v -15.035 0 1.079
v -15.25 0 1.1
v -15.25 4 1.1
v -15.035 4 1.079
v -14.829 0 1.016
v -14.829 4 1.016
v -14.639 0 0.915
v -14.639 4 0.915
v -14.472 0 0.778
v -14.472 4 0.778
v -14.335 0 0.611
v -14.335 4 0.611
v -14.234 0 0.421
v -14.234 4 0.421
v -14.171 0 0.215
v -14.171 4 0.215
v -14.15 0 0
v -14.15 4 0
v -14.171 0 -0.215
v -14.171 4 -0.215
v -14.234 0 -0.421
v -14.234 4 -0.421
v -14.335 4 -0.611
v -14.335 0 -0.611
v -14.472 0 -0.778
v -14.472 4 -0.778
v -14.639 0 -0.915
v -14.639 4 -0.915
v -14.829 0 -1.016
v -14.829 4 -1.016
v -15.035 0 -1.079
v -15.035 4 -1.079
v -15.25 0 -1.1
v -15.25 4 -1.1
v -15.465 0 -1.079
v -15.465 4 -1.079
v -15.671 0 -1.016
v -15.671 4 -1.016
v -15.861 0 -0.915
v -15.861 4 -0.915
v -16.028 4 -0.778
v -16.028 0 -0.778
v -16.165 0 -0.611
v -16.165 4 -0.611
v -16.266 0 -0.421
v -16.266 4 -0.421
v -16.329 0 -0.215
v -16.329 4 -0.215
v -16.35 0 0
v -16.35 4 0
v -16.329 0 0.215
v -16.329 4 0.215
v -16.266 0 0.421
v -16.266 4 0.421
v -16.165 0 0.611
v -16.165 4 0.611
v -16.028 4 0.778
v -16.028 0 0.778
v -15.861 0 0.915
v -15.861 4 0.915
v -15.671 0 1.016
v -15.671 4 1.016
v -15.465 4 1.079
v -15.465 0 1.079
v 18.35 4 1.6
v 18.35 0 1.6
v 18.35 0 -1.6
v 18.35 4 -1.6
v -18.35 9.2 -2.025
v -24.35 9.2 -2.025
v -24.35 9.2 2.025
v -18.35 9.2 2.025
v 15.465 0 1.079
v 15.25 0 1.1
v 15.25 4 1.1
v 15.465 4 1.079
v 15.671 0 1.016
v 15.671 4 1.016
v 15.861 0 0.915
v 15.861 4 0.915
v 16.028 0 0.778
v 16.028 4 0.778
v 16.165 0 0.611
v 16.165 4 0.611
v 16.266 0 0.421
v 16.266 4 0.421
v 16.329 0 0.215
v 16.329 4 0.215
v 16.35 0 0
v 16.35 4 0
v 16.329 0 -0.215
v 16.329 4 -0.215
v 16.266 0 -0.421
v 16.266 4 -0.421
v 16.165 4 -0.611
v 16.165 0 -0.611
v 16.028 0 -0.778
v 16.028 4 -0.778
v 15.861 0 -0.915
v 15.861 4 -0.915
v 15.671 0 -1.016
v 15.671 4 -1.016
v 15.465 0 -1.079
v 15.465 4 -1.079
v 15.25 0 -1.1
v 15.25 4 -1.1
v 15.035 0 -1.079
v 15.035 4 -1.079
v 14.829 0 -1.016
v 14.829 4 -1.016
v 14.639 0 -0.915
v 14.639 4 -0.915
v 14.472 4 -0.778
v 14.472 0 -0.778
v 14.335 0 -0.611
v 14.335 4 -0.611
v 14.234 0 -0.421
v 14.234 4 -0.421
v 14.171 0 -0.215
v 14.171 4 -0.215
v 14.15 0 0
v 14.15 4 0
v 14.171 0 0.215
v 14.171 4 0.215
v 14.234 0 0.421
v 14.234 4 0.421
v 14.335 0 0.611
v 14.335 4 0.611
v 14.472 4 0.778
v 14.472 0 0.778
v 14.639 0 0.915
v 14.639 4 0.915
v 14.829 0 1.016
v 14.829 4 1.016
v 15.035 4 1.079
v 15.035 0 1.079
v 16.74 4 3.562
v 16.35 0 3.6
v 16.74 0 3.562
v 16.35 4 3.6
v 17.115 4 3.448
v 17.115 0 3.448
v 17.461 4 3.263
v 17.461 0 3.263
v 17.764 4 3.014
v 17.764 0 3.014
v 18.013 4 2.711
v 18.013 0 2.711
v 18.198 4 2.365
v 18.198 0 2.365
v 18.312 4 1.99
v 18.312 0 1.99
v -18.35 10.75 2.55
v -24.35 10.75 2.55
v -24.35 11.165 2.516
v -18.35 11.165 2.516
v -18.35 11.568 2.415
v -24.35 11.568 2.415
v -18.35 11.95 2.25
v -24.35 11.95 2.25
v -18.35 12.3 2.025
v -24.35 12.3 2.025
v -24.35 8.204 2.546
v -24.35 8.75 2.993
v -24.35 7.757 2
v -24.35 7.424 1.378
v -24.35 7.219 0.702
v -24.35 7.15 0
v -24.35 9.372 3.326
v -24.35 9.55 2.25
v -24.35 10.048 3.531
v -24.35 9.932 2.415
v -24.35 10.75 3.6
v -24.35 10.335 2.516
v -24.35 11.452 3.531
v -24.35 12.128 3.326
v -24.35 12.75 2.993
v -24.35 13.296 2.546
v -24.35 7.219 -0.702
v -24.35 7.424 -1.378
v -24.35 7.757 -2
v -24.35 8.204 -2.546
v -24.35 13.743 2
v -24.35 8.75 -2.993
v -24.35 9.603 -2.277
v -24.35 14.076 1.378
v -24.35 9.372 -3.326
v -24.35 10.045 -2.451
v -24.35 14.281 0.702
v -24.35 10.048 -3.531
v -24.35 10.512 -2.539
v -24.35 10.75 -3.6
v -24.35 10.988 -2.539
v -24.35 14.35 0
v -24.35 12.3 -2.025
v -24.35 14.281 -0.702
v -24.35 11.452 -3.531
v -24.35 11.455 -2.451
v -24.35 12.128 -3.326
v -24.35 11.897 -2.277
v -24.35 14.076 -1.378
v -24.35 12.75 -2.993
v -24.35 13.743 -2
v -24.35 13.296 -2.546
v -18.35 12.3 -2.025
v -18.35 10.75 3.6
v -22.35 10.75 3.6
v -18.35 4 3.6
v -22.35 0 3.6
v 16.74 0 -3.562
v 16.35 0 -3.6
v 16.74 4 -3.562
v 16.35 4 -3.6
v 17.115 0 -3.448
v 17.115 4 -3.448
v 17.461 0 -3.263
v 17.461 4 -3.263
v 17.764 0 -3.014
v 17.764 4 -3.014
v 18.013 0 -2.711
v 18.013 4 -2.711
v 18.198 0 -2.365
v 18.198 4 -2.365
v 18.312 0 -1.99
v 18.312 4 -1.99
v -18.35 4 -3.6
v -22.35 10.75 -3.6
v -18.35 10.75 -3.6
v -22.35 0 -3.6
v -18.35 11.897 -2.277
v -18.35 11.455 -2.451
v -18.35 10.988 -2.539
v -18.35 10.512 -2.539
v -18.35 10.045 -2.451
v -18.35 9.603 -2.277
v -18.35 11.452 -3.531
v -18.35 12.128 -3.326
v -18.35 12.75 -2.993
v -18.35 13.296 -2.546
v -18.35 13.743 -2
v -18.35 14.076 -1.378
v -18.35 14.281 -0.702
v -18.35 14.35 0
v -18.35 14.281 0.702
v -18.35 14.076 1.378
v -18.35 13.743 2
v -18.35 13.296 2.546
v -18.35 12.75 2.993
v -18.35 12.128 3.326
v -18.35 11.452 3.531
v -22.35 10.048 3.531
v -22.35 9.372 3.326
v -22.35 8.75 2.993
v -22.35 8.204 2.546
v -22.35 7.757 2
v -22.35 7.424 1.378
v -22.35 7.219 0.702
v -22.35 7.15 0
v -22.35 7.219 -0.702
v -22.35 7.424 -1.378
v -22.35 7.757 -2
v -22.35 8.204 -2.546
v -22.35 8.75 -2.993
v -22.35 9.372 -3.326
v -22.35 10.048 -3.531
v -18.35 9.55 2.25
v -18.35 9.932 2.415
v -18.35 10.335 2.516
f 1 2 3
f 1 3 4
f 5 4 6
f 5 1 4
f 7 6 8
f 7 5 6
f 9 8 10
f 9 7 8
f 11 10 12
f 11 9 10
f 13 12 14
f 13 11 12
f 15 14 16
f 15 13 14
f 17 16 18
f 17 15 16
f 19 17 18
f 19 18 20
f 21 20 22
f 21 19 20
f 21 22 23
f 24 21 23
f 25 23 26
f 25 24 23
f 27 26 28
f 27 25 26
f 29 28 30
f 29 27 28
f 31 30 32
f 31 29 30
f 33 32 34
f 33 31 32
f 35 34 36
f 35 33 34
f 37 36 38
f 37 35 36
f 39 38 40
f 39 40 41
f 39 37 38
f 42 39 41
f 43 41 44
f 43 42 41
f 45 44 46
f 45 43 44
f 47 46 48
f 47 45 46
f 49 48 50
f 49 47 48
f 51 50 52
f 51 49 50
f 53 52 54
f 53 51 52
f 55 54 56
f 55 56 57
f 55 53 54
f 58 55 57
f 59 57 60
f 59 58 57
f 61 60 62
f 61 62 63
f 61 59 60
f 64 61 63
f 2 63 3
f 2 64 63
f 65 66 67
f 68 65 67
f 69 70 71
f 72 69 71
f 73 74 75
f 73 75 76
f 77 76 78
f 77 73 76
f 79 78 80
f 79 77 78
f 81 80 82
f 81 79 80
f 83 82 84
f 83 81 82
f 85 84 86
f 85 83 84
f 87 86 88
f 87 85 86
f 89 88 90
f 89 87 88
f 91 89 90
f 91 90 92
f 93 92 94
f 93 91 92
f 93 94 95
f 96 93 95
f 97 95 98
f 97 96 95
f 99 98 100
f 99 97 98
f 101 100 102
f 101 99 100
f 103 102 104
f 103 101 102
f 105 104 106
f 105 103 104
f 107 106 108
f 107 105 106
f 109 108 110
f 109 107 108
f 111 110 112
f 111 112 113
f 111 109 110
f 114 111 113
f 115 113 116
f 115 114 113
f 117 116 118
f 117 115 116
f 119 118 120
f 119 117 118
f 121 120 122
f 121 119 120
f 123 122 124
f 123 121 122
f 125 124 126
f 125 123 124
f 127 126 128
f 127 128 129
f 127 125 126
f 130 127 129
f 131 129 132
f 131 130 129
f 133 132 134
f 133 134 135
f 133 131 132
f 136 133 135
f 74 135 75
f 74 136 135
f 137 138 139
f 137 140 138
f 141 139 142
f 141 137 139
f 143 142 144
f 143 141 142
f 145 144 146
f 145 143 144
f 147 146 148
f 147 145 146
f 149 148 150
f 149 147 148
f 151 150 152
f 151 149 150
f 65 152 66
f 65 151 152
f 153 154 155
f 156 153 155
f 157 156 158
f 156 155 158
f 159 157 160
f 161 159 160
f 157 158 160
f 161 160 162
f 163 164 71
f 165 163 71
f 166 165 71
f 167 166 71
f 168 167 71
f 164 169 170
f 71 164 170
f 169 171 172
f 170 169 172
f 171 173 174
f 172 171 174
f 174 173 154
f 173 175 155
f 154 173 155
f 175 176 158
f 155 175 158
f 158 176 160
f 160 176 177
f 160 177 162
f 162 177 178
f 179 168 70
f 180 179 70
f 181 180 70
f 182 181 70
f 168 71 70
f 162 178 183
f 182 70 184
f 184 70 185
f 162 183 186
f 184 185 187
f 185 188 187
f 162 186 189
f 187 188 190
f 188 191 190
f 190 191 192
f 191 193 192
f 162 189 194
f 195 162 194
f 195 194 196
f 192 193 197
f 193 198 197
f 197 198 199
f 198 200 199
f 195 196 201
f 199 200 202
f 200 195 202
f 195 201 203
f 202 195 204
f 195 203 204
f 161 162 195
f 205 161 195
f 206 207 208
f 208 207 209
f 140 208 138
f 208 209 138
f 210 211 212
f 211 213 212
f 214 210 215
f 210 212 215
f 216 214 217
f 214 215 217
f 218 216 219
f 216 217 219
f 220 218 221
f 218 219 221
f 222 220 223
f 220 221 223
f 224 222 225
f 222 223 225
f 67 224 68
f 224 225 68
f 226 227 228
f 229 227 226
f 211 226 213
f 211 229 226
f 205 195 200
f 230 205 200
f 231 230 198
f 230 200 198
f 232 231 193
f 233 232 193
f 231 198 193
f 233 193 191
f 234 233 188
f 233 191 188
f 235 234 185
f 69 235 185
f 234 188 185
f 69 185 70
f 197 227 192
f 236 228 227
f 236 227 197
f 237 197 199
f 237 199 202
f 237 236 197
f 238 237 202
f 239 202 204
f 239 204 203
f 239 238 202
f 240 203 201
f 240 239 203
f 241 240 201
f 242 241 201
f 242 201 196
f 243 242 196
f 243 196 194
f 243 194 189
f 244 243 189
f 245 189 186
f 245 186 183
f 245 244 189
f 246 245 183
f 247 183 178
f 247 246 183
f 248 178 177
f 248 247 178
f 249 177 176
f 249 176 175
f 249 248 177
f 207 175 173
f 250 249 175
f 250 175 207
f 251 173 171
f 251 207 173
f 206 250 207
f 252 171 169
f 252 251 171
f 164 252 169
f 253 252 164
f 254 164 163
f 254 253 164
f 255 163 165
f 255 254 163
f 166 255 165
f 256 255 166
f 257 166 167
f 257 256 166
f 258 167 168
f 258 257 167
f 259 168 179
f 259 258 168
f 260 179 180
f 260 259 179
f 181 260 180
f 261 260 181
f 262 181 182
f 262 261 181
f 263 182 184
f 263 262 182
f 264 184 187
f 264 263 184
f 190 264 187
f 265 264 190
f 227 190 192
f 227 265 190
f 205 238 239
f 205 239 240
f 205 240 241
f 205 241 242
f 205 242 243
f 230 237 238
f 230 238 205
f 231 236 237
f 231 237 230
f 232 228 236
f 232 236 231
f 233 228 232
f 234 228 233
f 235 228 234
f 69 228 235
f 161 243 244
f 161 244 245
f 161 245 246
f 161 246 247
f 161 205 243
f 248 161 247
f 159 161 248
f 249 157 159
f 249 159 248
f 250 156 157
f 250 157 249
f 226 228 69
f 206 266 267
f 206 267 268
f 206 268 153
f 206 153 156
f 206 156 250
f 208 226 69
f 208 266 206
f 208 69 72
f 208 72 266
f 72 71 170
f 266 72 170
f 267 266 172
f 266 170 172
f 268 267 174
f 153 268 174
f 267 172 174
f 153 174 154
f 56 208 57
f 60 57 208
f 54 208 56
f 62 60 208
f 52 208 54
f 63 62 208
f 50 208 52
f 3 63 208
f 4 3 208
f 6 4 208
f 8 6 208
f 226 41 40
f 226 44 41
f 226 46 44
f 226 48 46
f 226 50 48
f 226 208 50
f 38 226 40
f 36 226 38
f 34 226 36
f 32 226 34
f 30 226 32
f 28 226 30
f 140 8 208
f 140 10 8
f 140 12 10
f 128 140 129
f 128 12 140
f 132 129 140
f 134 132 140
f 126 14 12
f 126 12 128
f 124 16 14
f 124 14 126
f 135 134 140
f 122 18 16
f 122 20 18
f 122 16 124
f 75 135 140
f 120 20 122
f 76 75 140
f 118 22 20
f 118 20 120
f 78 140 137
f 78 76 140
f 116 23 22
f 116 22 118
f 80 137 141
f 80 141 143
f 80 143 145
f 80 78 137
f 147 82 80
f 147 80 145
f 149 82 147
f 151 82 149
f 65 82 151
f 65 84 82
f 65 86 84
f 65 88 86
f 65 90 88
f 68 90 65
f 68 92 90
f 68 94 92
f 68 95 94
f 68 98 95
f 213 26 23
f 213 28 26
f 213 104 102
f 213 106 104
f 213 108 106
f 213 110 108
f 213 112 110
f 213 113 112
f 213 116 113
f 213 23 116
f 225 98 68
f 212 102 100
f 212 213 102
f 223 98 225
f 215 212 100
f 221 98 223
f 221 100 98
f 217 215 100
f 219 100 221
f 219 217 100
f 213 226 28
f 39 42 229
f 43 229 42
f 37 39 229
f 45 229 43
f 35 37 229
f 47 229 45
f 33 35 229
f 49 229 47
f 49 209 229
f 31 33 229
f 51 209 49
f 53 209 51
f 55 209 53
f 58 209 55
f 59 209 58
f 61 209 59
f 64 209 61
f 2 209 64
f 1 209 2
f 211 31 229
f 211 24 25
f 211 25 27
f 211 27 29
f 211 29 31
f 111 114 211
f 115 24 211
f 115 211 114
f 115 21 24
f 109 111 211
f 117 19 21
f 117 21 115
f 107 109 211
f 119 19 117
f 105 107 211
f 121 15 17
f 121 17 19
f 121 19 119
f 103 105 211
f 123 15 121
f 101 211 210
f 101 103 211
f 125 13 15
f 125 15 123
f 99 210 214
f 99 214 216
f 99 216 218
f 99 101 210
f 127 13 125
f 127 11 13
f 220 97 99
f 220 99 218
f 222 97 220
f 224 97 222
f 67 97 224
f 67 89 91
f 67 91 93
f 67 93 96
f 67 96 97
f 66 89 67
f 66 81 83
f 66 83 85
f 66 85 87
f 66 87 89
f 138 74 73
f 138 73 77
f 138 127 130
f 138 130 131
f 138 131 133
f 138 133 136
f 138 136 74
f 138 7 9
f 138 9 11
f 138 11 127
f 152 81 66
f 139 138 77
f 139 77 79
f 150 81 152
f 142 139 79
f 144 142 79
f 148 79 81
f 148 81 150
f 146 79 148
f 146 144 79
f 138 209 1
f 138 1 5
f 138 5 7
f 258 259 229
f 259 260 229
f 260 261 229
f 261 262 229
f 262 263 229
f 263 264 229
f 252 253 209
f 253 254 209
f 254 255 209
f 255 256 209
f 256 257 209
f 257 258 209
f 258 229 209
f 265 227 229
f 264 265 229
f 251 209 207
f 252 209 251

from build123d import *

# Parameters (mm, degrees)
SKETCH1_W           = 36.7
SKETCH1_H           = 7.2
SKETCH1_R           = 1.1
BOSS_EXTRUDE1_DEPTH = 4
SKETCH2_W           = 4
SKETCH2_H           = 7.2
BOSS_EXTRUDE2_DEPTH = 10.75
SKETCH3_R           = 3.6
BOSS_EXTRUDE3_DEPTH = 6
FILLET1_R           = 2
CUT_EXTRUDE1_DEPTH  = 6


with BuildPart() as part:
    # Sketch1 → Boss-Extrude1 (new body)
    with BuildSketch(Plane(origin=(0, 0, 0), x_dir=(1, 0, 0), z_dir=(0, 1, 0))):
        Rectangle(SKETCH1_W, SKETCH1_H)
        with Locations(Location((15.25, 0, 0), (0, 0, 270))):
            Circle(SKETCH1_R, mode=Mode.SUBTRACT)
        with Locations(Location((-15.25, 0, 0), (0, 0, 270))):
            Circle(SKETCH1_R, mode=Mode.SUBTRACT)
    extrude(amount=BOSS_EXTRUDE1_DEPTH)

    # Sketch2 → Boss-Extrude2 (add)
    with BuildSketch(Plane.XZ):
        with Locations((-20.35, 0)):
            Rectangle(SKETCH2_W, SKETCH2_H)
    extrude(amount=-BOSS_EXTRUDE2_DEPTH)

    # Sketch3 → Boss-Extrude3 (add)
    with BuildSketch(Plane(origin=(-18.35, 0, 0), x_dir=(0, 0, -1), z_dir=(1, 0, 0))):
        with Locations((0, 10.75)):
            Circle(SKETCH3_R)
    extrude(amount=-BOSS_EXTRUDE3_DEPTH)

    # Fillet1
    fillet1_edges = [part.edges().sort_by_distance(p)[0] for p in [
        (18.35, 2, -3.6),
        (18.35, 2, 3.6),
    ]]
    fillet(fillet1_edges, radius=FILLET1_R)

    # Sketch4 → Cut-Extrude1 (cut)
    with BuildSketch(Plane.ZY.offset(24.35)):
        with BuildLine():
            Line((-2.024845673, 9.2), (0, 9.2))
            Line((0, 9.2), (0, 12.3))
            Line((0, 12.3), (-2.024845673, 12.3))
            ThreePointArc((-2.024845673, 12.3), (-2.55, 10.75), (-2.024845673, 9.2))
        make_face()
        with BuildLine():
            Line((0, 12.3), (0, 9.2))
            Line((0, 9.2), (2.024845673, 9.2))
            ThreePointArc((2.024845673, 9.2), (2.415145593, 9.93172635), (2.55, 10.75))
            ThreePointArc((2.55, 10.75), (2.415145593, 11.56827365), (2.024845673, 12.3))
            Line((2.024845673, 12.3), (0, 12.3))
        make_face()
    extrude(amount=-CUT_EXTRUDE1_DEPTH, mode=Mode.SUBTRACT)


solid = part.part
